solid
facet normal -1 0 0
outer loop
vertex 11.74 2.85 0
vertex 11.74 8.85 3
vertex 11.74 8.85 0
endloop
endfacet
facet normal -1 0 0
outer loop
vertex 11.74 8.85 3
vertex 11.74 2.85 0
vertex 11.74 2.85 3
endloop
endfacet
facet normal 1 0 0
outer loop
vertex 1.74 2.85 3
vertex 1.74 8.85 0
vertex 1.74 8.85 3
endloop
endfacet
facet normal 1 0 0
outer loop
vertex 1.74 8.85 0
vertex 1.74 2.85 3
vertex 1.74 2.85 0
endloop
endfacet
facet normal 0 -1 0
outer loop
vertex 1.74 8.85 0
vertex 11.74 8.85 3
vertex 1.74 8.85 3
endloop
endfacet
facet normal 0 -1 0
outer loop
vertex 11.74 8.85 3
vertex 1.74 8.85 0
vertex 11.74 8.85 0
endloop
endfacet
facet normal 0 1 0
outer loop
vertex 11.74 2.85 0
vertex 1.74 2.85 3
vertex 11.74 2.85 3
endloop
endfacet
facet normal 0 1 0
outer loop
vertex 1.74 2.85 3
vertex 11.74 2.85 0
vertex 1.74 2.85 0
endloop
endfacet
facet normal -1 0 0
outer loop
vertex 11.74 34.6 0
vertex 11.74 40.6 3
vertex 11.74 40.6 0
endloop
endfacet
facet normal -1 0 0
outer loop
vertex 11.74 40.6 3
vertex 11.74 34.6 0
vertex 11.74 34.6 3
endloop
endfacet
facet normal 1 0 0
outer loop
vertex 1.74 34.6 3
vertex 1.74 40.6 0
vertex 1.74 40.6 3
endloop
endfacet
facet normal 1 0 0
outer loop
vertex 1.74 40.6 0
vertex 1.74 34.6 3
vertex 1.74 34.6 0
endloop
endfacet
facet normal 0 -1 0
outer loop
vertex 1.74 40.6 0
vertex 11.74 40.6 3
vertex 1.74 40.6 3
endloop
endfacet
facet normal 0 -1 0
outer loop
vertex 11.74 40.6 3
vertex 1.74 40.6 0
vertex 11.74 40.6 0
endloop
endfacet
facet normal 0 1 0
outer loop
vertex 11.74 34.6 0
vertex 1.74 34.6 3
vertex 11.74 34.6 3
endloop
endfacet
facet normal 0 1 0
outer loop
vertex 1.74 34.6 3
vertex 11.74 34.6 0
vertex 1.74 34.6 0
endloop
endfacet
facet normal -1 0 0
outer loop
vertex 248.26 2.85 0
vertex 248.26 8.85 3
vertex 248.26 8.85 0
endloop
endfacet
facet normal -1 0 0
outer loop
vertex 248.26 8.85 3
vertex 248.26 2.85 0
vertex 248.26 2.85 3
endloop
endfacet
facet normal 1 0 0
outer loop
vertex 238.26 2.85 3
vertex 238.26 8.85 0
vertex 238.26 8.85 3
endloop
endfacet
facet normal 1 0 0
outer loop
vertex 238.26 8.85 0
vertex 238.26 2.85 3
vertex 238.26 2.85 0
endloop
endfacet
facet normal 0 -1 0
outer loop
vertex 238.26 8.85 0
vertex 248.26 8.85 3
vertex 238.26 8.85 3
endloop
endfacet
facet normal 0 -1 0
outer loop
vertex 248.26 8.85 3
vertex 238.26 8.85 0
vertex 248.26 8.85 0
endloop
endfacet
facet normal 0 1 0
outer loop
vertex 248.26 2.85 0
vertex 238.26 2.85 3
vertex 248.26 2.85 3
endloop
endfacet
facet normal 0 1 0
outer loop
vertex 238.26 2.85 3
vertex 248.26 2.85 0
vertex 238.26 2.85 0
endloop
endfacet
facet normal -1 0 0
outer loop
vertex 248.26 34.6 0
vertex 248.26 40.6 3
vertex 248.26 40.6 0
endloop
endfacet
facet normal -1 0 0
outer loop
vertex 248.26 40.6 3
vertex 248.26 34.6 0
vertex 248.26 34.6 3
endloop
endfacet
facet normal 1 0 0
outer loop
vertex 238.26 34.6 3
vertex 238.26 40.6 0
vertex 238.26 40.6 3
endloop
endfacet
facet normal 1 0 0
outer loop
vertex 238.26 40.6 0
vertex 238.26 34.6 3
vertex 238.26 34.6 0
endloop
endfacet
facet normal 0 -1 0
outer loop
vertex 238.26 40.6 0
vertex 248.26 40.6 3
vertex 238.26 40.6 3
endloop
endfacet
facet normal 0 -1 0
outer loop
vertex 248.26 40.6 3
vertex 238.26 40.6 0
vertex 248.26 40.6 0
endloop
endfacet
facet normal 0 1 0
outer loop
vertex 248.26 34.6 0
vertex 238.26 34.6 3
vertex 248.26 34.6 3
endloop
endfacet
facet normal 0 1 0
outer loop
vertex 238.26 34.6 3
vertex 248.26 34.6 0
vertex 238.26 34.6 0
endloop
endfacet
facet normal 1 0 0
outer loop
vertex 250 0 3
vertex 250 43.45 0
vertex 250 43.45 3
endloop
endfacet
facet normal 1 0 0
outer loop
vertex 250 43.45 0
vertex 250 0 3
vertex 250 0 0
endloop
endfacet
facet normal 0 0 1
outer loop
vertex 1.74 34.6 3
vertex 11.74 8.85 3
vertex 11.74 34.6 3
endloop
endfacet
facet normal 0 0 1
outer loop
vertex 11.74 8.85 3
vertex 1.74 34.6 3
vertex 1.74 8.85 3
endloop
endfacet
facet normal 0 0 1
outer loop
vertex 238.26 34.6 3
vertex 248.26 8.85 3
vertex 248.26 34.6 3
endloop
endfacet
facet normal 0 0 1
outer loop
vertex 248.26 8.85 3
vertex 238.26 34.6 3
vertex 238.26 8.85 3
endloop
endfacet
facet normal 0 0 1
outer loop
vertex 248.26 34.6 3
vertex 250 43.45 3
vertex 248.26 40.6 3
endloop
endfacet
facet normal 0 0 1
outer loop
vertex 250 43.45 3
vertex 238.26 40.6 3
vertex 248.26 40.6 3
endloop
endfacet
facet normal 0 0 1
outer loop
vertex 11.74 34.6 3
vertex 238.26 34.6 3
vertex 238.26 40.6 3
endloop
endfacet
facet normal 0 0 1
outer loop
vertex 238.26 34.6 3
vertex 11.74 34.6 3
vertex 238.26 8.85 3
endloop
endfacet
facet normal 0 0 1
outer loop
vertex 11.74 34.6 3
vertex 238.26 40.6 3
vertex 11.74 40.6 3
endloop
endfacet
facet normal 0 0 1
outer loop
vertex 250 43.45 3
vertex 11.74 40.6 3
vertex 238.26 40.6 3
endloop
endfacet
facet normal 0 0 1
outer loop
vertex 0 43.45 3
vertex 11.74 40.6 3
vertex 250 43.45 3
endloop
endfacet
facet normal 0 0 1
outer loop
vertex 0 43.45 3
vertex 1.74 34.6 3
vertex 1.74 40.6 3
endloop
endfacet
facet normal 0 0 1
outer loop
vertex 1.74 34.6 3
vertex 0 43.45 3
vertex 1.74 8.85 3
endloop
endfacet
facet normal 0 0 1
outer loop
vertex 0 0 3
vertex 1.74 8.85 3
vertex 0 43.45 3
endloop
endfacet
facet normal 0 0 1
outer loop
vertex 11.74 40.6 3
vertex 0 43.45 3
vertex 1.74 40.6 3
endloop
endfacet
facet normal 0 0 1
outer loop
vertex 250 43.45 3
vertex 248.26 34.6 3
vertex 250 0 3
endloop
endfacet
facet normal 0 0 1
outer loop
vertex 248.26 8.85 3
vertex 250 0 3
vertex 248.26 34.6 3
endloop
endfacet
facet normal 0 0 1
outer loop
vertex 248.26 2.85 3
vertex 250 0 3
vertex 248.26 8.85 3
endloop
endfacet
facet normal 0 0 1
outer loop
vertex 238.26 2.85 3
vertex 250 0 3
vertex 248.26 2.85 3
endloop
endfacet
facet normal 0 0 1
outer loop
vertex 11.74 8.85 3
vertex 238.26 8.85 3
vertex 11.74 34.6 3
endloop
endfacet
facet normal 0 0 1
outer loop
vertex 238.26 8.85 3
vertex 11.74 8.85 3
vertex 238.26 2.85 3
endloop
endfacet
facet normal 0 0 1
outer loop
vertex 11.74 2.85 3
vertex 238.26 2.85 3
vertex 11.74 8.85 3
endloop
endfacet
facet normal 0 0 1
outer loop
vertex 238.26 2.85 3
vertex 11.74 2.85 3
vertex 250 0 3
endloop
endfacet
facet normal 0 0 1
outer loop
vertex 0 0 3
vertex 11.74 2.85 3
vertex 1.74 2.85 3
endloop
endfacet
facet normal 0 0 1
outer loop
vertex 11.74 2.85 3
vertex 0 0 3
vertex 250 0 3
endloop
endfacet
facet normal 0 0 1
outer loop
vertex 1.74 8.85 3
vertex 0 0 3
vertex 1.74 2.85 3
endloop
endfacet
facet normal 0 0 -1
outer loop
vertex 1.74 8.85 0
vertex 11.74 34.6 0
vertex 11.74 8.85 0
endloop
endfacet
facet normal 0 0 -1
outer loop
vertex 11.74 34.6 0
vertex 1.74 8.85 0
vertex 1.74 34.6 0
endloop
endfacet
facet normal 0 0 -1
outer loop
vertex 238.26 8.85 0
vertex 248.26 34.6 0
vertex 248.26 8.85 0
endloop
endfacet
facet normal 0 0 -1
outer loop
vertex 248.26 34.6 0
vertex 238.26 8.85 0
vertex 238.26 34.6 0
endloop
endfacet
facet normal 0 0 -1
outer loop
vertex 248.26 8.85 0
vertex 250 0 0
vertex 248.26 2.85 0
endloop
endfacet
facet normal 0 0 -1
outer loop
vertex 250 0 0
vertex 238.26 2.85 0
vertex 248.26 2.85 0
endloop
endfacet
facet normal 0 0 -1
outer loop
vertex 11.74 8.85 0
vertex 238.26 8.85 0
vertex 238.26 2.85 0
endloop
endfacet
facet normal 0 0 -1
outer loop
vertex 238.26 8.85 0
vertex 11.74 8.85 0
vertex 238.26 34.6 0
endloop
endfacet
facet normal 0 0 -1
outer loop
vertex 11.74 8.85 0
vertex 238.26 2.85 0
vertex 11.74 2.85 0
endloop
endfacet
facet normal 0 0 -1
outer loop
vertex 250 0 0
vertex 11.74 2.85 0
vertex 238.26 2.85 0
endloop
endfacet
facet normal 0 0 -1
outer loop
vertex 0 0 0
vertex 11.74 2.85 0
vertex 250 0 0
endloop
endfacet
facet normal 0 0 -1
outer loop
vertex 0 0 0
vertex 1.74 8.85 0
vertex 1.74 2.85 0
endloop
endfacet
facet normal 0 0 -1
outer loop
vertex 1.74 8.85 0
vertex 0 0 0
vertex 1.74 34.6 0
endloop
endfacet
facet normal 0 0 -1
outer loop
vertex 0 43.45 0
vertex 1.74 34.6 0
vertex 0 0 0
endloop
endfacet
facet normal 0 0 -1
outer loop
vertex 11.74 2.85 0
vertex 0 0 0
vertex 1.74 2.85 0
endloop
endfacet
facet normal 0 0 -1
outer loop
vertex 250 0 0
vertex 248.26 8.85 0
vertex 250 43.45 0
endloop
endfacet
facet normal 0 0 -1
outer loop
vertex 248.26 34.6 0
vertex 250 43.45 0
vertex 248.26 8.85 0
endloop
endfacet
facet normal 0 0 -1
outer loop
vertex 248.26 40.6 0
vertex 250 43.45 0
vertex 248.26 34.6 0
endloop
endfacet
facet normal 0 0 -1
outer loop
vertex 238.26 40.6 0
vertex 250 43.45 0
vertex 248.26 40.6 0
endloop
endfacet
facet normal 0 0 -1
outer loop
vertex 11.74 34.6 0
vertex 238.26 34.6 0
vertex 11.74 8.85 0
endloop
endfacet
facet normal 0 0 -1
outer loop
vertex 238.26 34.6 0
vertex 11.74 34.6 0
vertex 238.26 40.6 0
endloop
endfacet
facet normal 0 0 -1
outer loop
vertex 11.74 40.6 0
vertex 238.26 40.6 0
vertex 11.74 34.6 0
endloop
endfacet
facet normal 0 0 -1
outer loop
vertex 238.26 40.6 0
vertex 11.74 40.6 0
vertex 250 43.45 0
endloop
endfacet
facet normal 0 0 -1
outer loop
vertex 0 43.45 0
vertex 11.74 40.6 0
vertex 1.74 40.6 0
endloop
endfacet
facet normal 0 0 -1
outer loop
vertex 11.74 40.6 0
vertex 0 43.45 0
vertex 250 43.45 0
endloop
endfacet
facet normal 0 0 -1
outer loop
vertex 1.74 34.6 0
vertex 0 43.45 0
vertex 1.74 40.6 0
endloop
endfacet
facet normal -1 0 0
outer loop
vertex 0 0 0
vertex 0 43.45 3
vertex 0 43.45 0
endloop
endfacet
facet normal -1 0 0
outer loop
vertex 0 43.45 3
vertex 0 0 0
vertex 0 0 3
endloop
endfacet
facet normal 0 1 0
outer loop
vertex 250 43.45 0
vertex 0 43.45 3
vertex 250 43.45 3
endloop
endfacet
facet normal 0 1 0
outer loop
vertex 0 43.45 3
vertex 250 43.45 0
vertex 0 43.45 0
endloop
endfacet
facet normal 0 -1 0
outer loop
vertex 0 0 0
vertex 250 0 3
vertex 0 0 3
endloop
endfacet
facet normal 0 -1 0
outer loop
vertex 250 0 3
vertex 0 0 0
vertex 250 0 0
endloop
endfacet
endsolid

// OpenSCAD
// TL1_Plate_1U_Standard
// Homelab Rack CAD Standard v1.0 - millimeters
// Mount positions provisional: test-fit against DeskPi TL1 rail!
plate_width=250;
plate_height=43.45;
plate_thickness=3;
slot_width=10;
slot_height=6;
slot_x=[6.74,243.26];
slot_y=[5.85,37.6];
difference() {
  cube([plate_width,plate_height,plate_thickness]);
  for (x=slot_x) for (y=slot_y)
    translate([x-slot_width/2,y-slot_height/2,-0.5])
      cube([slot_width,slot_height,plate_thickness+1]);
}
